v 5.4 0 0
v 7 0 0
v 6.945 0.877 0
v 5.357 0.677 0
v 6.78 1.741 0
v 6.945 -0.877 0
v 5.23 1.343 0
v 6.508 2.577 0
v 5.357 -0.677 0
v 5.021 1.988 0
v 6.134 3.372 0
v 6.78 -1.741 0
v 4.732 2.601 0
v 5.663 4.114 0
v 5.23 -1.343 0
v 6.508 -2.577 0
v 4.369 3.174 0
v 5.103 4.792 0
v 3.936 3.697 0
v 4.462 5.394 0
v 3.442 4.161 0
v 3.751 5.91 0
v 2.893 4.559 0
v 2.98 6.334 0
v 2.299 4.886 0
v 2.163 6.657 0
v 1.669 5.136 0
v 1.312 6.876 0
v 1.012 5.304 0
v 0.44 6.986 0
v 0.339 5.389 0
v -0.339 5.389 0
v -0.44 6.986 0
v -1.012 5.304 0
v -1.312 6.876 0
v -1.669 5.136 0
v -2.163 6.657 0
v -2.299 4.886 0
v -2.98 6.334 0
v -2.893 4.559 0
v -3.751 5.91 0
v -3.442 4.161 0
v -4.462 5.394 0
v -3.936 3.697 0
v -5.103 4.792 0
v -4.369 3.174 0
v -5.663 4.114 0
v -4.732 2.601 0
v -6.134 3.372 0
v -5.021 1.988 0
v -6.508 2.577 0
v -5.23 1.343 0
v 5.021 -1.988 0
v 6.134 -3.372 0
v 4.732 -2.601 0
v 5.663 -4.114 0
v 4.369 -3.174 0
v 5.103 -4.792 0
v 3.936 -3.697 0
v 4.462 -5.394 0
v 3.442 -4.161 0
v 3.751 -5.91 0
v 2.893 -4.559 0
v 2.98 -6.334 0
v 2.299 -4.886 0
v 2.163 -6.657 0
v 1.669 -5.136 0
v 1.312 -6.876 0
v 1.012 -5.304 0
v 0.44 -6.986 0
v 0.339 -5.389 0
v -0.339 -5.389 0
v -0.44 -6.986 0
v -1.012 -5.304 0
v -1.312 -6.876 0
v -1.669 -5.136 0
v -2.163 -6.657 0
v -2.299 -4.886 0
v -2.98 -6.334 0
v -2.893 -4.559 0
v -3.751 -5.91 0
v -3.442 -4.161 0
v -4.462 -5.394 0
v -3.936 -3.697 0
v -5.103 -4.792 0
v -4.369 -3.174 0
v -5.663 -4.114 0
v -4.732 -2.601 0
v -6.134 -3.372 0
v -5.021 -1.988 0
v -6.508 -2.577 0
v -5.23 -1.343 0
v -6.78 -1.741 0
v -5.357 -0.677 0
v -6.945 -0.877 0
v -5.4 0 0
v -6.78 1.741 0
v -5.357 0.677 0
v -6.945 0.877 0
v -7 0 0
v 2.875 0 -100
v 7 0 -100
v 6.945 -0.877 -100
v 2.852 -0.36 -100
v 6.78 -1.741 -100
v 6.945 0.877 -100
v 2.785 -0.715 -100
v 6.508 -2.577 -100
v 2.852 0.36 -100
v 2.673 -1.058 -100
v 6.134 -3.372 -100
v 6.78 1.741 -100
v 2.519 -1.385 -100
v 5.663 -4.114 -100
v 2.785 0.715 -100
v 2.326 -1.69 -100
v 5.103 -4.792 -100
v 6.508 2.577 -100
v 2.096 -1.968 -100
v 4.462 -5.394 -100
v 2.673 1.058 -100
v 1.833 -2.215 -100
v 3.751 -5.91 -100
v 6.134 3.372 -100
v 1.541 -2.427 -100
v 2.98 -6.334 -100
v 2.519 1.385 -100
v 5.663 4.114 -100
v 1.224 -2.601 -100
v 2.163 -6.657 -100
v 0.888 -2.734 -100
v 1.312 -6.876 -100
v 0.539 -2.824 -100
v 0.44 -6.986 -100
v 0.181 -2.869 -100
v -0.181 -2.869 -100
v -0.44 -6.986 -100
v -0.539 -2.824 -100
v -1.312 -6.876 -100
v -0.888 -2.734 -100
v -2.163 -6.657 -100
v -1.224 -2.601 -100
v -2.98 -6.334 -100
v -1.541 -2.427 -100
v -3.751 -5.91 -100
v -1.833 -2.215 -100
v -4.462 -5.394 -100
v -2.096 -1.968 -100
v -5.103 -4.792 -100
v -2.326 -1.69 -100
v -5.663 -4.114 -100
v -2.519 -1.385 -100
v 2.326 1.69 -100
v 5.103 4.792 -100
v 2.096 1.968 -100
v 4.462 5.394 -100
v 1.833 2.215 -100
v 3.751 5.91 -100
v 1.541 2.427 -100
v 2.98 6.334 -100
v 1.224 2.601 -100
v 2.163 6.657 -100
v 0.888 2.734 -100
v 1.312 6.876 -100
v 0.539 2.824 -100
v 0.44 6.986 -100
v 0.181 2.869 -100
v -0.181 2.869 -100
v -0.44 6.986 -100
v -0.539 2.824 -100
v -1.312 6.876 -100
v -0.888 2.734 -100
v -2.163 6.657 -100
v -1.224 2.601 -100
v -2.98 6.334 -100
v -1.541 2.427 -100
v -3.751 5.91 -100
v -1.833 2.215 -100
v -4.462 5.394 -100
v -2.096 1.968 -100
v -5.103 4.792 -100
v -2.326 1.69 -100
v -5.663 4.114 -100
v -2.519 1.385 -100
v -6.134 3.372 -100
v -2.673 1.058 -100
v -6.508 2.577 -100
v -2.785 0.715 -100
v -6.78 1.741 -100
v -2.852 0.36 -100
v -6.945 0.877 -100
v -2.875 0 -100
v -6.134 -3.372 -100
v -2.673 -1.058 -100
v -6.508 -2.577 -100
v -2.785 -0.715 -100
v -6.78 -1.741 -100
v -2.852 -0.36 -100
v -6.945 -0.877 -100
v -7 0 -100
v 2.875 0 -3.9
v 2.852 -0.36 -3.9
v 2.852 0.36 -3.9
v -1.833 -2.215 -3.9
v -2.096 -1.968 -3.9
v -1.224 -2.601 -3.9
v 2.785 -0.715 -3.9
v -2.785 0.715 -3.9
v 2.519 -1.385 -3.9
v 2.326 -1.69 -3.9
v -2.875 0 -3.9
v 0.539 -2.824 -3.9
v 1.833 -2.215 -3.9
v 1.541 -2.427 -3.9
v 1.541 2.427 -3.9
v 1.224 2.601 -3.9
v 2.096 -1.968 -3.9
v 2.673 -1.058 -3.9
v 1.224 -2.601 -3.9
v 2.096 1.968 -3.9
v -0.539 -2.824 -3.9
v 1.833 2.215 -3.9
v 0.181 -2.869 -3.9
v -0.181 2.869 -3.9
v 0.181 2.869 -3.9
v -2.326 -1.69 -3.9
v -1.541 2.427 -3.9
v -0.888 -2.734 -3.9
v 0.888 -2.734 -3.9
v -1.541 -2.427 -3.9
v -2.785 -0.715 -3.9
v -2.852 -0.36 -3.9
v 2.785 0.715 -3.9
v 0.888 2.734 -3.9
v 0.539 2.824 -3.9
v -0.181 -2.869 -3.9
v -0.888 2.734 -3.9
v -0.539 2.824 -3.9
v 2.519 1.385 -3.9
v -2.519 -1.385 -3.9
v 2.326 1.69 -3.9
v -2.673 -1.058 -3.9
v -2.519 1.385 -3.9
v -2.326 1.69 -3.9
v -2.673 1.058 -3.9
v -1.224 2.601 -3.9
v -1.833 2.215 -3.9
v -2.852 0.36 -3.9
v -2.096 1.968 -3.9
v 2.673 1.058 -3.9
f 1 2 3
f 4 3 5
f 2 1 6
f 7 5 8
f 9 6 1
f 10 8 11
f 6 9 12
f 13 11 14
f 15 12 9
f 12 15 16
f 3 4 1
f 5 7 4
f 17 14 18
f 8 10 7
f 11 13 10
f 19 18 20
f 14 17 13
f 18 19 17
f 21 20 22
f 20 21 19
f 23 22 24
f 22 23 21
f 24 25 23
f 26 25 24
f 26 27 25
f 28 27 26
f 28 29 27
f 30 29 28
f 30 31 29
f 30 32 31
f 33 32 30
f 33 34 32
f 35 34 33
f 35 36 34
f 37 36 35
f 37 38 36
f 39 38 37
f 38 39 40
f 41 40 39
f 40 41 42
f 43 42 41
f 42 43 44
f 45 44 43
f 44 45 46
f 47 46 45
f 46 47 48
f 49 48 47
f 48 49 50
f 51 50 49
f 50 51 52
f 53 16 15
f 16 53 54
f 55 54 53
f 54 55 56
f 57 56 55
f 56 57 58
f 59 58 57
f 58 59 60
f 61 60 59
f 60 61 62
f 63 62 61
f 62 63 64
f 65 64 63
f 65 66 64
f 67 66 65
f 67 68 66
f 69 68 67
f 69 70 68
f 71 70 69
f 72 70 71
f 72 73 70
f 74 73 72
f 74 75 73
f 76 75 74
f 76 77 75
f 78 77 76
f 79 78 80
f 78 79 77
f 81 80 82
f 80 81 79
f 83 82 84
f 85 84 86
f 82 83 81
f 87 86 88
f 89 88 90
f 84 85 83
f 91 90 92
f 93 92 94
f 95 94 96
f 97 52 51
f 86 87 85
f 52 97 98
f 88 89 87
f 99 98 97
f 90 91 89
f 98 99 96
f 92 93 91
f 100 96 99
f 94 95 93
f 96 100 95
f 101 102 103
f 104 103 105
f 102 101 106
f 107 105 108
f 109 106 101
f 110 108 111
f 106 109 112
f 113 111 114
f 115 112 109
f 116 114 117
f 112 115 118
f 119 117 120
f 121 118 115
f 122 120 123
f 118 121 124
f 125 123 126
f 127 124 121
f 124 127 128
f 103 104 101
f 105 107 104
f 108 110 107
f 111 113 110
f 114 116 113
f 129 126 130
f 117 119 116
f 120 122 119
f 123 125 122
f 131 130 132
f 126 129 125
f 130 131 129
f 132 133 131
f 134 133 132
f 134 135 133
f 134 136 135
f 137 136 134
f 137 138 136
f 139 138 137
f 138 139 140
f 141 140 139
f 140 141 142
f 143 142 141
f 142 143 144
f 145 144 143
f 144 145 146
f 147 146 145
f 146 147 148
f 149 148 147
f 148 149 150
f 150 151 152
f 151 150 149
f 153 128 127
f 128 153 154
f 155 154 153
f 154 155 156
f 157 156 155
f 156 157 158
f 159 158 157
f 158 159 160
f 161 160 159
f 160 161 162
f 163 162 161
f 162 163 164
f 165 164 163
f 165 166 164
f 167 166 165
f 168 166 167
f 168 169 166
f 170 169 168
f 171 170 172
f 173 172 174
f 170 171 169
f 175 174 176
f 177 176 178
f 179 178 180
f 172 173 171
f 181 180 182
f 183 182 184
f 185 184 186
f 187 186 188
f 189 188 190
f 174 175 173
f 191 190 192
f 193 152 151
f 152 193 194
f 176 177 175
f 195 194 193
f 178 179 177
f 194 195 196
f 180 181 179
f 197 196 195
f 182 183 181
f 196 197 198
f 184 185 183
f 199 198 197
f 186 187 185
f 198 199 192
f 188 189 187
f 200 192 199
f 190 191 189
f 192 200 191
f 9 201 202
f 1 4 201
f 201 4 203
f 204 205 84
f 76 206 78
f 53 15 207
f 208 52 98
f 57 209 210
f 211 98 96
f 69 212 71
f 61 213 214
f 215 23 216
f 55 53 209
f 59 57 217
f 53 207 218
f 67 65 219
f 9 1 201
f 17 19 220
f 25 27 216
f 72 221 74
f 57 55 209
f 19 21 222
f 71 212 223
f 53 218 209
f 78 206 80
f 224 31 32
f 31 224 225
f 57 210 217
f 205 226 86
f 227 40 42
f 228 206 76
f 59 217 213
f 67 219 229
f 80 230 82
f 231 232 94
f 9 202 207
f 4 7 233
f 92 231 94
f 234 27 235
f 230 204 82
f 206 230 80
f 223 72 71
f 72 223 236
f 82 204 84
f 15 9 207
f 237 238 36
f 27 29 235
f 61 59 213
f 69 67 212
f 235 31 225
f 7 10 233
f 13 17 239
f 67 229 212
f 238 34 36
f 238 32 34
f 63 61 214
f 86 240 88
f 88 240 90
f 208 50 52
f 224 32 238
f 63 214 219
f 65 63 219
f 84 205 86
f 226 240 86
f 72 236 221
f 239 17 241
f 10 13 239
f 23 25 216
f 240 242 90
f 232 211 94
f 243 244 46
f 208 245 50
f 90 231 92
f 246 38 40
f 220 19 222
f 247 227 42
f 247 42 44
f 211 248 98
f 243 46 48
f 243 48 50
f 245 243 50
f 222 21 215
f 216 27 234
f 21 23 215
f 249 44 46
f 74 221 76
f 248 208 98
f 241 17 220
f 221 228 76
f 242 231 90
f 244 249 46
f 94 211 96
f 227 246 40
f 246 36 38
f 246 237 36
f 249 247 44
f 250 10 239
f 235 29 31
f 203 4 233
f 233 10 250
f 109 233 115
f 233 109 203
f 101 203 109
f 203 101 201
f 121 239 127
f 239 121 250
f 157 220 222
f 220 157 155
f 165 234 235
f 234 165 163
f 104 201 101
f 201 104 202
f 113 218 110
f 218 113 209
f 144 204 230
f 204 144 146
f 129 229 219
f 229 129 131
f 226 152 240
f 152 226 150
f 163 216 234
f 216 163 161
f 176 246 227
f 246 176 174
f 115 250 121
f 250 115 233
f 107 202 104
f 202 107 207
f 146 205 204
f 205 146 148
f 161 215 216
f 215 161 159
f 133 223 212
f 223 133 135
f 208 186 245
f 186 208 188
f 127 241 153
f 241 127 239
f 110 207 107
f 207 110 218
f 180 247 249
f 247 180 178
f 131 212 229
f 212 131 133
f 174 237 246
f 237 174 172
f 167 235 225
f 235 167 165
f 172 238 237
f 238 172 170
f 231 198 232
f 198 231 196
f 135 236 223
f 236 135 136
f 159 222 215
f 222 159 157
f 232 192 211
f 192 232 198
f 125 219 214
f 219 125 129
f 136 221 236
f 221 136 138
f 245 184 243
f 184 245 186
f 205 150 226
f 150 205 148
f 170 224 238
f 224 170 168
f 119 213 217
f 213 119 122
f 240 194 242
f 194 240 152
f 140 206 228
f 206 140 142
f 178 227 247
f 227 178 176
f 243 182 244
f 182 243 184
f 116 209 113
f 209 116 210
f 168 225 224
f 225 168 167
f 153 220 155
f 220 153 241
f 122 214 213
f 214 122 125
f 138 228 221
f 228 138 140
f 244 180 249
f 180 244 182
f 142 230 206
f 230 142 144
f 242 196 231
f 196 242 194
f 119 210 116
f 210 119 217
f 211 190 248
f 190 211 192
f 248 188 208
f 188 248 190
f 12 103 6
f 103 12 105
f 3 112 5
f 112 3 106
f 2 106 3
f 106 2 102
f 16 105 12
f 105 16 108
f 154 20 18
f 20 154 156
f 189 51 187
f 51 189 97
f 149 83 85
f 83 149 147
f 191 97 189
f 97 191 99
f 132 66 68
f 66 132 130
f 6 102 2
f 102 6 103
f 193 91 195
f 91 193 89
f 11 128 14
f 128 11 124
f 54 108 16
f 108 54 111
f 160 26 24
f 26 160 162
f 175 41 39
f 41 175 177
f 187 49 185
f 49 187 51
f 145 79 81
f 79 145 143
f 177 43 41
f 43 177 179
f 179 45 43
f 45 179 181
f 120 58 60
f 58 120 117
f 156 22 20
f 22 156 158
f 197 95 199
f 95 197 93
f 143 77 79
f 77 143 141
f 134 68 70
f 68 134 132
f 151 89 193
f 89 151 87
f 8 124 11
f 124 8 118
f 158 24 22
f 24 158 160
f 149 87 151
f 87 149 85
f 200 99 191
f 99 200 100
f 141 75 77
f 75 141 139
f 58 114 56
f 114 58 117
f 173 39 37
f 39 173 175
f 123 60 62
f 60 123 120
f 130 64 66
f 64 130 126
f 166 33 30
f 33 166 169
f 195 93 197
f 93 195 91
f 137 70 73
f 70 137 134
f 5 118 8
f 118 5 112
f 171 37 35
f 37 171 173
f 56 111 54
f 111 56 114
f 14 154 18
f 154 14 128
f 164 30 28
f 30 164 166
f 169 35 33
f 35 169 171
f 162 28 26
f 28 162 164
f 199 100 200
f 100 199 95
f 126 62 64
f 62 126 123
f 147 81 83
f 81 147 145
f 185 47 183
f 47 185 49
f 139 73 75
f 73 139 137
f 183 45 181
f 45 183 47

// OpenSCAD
$fn = 50;


difference() {
	union() {
		translate(v = [0, 0, -100.0000000000]) {
			cylinder(h = 100, r = 7.0000000000);
		}
		cylinder(h = 0, r = 13.0000000000);
	}
	union() {
		translate(v = [0, 0, 0]) {
			rotate(a = [0, 0, 0]) {
				difference() {
					union() {
						#translate(v = [0, 0, -100.0000000000]) {
							cylinder(h = 100, r = 2.6000000000);
						}
						#translate(v = [0, 0, -3.9000000000]) {
							cylinder(h = 3.9000000000, r = 7.0000000000, r1 = 2.8750000000, r2 = 5.4000000000);
						}
						#translate(v = [0, 0, -100.0000000000]) {
							cylinder(h = 100, r = 2.8750000000);
						}
						#translate(v = [0, 0, -100.0000000000]) {
							cylinder(h = 100, r = 2.6000000000);
						}
					}
					union();
				}
			}
		}
	}
}
